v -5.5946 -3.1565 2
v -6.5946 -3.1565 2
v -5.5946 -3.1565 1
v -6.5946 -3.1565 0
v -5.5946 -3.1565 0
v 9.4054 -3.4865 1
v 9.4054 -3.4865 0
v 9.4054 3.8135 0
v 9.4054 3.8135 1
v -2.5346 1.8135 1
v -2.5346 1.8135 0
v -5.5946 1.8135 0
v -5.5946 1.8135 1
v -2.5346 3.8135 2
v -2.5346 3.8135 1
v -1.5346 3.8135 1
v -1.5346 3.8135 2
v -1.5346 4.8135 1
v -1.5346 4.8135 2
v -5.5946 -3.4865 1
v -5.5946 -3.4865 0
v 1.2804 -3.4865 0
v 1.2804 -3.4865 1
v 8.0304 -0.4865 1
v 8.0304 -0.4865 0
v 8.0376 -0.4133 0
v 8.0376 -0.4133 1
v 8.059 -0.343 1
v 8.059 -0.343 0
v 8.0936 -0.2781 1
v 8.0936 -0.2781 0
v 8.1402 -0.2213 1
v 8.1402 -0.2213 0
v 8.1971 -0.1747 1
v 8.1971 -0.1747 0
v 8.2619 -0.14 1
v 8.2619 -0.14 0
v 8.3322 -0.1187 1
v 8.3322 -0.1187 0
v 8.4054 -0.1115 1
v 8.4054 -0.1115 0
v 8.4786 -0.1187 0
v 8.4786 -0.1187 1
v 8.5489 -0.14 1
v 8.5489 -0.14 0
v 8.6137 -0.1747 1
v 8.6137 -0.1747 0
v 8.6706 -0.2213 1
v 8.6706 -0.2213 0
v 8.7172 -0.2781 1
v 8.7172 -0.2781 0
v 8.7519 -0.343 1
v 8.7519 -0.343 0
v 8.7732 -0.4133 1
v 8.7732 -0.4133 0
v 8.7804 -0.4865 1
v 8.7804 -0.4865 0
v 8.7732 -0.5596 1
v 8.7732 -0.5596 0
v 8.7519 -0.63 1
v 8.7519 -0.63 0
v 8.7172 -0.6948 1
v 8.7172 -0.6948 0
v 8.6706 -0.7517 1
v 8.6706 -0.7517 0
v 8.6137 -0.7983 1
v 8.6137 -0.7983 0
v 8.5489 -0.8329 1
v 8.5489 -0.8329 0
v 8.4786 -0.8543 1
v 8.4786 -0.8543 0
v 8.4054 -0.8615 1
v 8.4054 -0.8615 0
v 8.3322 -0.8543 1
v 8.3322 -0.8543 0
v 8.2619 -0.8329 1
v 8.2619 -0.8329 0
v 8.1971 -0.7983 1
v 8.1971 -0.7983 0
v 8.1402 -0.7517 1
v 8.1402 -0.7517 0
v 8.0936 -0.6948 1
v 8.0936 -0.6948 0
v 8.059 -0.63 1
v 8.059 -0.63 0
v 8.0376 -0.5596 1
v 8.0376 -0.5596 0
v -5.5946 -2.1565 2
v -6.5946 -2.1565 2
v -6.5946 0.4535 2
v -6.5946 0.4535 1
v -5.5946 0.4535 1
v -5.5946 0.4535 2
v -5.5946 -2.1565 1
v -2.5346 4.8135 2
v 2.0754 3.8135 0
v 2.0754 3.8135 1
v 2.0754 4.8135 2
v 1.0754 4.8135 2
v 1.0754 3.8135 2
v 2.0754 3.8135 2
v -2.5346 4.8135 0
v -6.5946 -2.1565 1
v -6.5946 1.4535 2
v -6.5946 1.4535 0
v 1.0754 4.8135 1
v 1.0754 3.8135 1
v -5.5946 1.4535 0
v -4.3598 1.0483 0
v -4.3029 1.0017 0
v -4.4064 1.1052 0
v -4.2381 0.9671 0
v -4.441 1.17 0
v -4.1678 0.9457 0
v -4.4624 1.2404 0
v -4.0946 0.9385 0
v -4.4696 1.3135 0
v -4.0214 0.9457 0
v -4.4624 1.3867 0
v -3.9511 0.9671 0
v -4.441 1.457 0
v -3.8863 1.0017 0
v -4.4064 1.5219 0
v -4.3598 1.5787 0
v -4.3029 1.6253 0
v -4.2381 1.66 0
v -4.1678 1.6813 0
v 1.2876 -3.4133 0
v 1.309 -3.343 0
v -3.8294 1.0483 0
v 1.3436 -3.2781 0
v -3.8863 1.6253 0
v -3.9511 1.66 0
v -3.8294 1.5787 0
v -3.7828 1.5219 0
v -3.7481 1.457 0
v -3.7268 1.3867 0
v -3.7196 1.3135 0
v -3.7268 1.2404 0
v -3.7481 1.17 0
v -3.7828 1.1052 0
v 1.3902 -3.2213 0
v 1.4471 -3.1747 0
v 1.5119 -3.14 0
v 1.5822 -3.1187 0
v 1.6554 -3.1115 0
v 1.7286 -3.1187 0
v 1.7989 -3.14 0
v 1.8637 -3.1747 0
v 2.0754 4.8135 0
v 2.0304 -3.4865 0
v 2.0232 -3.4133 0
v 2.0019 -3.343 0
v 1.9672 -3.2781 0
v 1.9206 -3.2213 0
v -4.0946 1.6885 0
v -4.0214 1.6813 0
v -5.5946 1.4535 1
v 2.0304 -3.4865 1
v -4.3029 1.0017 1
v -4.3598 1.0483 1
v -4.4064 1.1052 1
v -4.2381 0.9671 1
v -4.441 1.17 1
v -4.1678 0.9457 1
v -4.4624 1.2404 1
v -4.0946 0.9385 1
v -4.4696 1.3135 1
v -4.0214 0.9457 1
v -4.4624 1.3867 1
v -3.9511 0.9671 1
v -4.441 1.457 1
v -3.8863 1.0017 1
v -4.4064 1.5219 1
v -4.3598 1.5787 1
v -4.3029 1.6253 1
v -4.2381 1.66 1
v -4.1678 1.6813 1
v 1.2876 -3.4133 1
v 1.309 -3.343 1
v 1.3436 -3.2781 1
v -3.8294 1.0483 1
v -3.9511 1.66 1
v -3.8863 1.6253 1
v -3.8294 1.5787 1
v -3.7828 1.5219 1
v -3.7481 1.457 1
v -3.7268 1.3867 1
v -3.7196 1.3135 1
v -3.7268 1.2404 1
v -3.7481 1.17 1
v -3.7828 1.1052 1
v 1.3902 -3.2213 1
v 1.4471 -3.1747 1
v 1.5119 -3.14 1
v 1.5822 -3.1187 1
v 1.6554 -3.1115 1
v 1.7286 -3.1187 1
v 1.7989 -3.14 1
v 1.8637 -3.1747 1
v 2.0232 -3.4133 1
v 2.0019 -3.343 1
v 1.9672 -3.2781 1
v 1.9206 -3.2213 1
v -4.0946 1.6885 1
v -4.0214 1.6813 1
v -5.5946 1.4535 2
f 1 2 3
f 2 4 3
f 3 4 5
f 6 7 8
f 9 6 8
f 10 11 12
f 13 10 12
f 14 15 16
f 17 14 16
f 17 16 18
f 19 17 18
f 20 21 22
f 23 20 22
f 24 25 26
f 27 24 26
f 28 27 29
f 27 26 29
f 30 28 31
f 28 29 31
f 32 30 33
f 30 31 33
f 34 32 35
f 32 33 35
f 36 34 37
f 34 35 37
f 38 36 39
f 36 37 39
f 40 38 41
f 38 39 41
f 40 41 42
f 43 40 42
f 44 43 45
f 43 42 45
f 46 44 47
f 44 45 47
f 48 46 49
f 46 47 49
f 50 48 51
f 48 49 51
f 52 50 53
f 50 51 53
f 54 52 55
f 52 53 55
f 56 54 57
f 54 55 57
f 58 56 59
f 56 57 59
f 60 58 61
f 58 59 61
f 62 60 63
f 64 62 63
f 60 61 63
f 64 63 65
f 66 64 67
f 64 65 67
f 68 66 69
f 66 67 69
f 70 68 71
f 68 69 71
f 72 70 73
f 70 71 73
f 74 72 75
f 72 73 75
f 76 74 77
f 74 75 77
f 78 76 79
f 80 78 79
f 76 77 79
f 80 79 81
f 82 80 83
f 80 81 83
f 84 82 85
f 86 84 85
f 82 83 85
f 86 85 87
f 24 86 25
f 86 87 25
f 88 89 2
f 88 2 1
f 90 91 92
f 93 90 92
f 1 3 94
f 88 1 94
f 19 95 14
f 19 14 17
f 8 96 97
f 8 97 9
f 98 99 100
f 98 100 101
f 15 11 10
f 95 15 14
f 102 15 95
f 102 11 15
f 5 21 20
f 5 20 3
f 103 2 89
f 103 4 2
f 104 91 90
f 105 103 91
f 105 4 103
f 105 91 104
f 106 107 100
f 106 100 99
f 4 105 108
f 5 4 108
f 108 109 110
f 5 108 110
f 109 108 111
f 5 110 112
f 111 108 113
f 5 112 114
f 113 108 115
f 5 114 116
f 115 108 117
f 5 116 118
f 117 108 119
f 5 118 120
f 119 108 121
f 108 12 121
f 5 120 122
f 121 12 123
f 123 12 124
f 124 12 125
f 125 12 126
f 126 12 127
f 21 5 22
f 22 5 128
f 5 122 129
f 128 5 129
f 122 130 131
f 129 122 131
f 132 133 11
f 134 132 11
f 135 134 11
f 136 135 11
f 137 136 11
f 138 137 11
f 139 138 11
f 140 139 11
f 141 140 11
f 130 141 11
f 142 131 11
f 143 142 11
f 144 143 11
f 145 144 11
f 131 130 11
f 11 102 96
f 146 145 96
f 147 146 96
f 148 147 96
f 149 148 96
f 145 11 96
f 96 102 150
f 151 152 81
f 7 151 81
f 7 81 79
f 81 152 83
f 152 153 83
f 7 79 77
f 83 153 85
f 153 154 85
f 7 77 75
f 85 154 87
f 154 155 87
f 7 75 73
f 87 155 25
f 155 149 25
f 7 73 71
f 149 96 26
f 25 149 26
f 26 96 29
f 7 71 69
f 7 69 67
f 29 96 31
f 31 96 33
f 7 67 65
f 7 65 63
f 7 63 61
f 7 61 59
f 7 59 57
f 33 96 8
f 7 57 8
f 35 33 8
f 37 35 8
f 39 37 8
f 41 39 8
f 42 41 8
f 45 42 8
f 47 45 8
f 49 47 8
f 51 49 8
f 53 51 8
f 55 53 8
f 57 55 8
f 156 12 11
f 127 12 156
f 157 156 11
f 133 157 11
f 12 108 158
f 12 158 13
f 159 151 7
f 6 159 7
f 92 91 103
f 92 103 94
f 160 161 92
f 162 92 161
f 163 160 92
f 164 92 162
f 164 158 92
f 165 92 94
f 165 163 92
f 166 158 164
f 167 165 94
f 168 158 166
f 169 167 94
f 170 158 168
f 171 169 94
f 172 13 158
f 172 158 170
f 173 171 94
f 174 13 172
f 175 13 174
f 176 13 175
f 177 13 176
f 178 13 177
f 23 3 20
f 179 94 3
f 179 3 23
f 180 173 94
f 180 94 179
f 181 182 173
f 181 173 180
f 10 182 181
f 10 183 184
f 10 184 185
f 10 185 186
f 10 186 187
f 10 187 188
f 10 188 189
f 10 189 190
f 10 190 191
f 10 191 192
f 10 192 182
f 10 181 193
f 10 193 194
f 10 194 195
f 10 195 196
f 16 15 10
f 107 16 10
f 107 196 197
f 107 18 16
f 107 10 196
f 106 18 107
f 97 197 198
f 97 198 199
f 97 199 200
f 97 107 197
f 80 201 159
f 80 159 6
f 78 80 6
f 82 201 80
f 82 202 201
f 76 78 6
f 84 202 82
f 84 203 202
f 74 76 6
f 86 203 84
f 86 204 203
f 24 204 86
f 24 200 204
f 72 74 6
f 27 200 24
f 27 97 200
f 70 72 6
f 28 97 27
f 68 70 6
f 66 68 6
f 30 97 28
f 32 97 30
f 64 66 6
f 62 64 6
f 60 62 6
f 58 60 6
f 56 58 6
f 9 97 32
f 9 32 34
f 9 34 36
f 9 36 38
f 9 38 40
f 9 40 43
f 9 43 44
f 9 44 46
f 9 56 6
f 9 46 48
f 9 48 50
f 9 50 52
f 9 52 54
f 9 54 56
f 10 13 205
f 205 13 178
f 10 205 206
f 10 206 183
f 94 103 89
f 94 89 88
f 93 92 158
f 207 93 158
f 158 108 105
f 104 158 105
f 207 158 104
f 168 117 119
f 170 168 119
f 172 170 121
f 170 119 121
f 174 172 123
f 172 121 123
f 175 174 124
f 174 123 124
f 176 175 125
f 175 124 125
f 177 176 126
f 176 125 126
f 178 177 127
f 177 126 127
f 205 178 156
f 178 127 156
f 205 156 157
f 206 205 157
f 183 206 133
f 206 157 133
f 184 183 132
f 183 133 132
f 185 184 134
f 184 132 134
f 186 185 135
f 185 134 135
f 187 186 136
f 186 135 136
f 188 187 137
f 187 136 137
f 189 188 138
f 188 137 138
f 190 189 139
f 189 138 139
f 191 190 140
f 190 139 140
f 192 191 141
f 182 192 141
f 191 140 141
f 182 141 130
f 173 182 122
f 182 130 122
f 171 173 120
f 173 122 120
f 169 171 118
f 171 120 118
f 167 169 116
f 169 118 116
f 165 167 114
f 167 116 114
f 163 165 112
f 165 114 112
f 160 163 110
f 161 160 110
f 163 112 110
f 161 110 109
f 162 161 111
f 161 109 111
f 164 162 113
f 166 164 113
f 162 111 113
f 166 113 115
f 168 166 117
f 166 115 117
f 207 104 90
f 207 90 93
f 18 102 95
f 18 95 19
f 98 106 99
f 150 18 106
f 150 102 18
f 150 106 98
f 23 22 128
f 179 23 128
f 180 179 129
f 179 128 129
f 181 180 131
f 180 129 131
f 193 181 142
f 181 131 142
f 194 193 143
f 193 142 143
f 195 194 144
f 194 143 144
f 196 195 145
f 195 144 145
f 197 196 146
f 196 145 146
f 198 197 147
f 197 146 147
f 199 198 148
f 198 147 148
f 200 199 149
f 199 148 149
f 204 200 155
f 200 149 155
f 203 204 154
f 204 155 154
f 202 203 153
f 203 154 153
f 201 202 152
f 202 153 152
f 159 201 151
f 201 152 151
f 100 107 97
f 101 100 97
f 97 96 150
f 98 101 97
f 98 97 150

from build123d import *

# Parameters (mm, degrees)
SKETCH1_W              = 15
SKETCH1_H              = 7.3
BASE_EXTRUDE1_DEPTH    = 1
NOTCH_W                = 3.06
NOTCH_H                = 2
CUT_EXTRUDE1_DEPTH     = 1
SKETCH5_W              = 4.61
SKETCH5_H              = 1
TOP_LED_EXTRUDE_DEPTH  = 1
SKETCH6_W              = 1
SKETCH6_H              = 1
TOP_CLAMP_DEPTH        = 1
SKETCH7_W              = 1
SKETCH7_H              = 4.61
SIDE_LED_EXTRUDE_DEPTH = 1
SKETCH8_W              = 1
SKETCH8_H              = 1
SIDE_CLAMP_DEPTH       = 1
SKETCH9_R              = 0.375
SCREWHOLES_DEPTH       = 1


with BuildPart() as part:
    # Sketch1 → Base-Extrude1 (new body)
    with BuildSketch(Plane.XY):
        with Locations((1.905405405, 0.163513514)):
            Rectangle(SKETCH1_W, SKETCH1_H)
    extrude(amount=BASE_EXTRUDE1_DEPTH)

    # Notch → Cut-Extrude1 (cut)
    with BuildSketch(Plane(origin=(0, 0, 0), x_dir=(-1, 0, 0), z_dir=(0, 0, -1))):
        with Locations((4.064594595, 2.813513514)):
            Rectangle(NOTCH_W, NOTCH_H)
    extrude(amount=-CUT_EXTRUDE1_DEPTH, mode=Mode.SUBTRACT)

    # Sketch5 → Top-LED-Extrude (add)
    with BuildSketch(Plane.XY.offset(1)):
        with Locations((-0.229594595, 4.313513514)):
            Rectangle(SKETCH5_W, SKETCH5_H)
    extrude(amount=-TOP_LED_EXTRUDE_DEPTH)

    # Sketch6 → Top-Clamp (add)
    with BuildSketch(Plane.XY.offset(1)):
        with Locations((-2.034594595, 4.313513514)):
            Rectangle(SKETCH6_W, SKETCH6_H)
        with Locations((1.575405405, 4.313513514)):
            Rectangle(SKETCH6_W, SKETCH6_H)
    extrude(amount=TOP_CLAMP_DEPTH)

    # Sketch7 → Side-LED-Extrude (add)
    with BuildSketch(Plane.ZY.offset(5.594594595)):
        with Locations((0.5, -0.851486486)):
            Rectangle(SKETCH7_W, SKETCH7_H)
    extrude(amount=SIDE_LED_EXTRUDE_DEPTH)

    # Sketch8 → Side-Clamp (add)
    with BuildSketch(Plane.XY.offset(1)):
        with Locations((-6.094594595, -2.656486486)):
            Rectangle(SKETCH8_W, SKETCH8_H)
        with Locations((-6.094594595, 0.953513514)):
            Rectangle(SKETCH8_W, SKETCH8_H)
    extrude(amount=SIDE_CLAMP_DEPTH)

    # Sketch9 → ScrewHoles (cut)
    with BuildSketch(Plane(origin=(0, 0, 0), x_dir=(-1, 0, 0), z_dir=(0, 0, -1))):
        with Locations((-8.405405405, -0.486486486)):
            Circle(SKETCH9_R)
        with Locations((4.094594595, 1.313513514)):
            Circle(SKETCH9_R)
        with Locations((-1.655405405, -3.486486486)):
            Circle(SKETCH9_R)
    extrude(amount=-SCREWHOLES_DEPTH, mode=Mode.SUBTRACT)


solid = part.part
